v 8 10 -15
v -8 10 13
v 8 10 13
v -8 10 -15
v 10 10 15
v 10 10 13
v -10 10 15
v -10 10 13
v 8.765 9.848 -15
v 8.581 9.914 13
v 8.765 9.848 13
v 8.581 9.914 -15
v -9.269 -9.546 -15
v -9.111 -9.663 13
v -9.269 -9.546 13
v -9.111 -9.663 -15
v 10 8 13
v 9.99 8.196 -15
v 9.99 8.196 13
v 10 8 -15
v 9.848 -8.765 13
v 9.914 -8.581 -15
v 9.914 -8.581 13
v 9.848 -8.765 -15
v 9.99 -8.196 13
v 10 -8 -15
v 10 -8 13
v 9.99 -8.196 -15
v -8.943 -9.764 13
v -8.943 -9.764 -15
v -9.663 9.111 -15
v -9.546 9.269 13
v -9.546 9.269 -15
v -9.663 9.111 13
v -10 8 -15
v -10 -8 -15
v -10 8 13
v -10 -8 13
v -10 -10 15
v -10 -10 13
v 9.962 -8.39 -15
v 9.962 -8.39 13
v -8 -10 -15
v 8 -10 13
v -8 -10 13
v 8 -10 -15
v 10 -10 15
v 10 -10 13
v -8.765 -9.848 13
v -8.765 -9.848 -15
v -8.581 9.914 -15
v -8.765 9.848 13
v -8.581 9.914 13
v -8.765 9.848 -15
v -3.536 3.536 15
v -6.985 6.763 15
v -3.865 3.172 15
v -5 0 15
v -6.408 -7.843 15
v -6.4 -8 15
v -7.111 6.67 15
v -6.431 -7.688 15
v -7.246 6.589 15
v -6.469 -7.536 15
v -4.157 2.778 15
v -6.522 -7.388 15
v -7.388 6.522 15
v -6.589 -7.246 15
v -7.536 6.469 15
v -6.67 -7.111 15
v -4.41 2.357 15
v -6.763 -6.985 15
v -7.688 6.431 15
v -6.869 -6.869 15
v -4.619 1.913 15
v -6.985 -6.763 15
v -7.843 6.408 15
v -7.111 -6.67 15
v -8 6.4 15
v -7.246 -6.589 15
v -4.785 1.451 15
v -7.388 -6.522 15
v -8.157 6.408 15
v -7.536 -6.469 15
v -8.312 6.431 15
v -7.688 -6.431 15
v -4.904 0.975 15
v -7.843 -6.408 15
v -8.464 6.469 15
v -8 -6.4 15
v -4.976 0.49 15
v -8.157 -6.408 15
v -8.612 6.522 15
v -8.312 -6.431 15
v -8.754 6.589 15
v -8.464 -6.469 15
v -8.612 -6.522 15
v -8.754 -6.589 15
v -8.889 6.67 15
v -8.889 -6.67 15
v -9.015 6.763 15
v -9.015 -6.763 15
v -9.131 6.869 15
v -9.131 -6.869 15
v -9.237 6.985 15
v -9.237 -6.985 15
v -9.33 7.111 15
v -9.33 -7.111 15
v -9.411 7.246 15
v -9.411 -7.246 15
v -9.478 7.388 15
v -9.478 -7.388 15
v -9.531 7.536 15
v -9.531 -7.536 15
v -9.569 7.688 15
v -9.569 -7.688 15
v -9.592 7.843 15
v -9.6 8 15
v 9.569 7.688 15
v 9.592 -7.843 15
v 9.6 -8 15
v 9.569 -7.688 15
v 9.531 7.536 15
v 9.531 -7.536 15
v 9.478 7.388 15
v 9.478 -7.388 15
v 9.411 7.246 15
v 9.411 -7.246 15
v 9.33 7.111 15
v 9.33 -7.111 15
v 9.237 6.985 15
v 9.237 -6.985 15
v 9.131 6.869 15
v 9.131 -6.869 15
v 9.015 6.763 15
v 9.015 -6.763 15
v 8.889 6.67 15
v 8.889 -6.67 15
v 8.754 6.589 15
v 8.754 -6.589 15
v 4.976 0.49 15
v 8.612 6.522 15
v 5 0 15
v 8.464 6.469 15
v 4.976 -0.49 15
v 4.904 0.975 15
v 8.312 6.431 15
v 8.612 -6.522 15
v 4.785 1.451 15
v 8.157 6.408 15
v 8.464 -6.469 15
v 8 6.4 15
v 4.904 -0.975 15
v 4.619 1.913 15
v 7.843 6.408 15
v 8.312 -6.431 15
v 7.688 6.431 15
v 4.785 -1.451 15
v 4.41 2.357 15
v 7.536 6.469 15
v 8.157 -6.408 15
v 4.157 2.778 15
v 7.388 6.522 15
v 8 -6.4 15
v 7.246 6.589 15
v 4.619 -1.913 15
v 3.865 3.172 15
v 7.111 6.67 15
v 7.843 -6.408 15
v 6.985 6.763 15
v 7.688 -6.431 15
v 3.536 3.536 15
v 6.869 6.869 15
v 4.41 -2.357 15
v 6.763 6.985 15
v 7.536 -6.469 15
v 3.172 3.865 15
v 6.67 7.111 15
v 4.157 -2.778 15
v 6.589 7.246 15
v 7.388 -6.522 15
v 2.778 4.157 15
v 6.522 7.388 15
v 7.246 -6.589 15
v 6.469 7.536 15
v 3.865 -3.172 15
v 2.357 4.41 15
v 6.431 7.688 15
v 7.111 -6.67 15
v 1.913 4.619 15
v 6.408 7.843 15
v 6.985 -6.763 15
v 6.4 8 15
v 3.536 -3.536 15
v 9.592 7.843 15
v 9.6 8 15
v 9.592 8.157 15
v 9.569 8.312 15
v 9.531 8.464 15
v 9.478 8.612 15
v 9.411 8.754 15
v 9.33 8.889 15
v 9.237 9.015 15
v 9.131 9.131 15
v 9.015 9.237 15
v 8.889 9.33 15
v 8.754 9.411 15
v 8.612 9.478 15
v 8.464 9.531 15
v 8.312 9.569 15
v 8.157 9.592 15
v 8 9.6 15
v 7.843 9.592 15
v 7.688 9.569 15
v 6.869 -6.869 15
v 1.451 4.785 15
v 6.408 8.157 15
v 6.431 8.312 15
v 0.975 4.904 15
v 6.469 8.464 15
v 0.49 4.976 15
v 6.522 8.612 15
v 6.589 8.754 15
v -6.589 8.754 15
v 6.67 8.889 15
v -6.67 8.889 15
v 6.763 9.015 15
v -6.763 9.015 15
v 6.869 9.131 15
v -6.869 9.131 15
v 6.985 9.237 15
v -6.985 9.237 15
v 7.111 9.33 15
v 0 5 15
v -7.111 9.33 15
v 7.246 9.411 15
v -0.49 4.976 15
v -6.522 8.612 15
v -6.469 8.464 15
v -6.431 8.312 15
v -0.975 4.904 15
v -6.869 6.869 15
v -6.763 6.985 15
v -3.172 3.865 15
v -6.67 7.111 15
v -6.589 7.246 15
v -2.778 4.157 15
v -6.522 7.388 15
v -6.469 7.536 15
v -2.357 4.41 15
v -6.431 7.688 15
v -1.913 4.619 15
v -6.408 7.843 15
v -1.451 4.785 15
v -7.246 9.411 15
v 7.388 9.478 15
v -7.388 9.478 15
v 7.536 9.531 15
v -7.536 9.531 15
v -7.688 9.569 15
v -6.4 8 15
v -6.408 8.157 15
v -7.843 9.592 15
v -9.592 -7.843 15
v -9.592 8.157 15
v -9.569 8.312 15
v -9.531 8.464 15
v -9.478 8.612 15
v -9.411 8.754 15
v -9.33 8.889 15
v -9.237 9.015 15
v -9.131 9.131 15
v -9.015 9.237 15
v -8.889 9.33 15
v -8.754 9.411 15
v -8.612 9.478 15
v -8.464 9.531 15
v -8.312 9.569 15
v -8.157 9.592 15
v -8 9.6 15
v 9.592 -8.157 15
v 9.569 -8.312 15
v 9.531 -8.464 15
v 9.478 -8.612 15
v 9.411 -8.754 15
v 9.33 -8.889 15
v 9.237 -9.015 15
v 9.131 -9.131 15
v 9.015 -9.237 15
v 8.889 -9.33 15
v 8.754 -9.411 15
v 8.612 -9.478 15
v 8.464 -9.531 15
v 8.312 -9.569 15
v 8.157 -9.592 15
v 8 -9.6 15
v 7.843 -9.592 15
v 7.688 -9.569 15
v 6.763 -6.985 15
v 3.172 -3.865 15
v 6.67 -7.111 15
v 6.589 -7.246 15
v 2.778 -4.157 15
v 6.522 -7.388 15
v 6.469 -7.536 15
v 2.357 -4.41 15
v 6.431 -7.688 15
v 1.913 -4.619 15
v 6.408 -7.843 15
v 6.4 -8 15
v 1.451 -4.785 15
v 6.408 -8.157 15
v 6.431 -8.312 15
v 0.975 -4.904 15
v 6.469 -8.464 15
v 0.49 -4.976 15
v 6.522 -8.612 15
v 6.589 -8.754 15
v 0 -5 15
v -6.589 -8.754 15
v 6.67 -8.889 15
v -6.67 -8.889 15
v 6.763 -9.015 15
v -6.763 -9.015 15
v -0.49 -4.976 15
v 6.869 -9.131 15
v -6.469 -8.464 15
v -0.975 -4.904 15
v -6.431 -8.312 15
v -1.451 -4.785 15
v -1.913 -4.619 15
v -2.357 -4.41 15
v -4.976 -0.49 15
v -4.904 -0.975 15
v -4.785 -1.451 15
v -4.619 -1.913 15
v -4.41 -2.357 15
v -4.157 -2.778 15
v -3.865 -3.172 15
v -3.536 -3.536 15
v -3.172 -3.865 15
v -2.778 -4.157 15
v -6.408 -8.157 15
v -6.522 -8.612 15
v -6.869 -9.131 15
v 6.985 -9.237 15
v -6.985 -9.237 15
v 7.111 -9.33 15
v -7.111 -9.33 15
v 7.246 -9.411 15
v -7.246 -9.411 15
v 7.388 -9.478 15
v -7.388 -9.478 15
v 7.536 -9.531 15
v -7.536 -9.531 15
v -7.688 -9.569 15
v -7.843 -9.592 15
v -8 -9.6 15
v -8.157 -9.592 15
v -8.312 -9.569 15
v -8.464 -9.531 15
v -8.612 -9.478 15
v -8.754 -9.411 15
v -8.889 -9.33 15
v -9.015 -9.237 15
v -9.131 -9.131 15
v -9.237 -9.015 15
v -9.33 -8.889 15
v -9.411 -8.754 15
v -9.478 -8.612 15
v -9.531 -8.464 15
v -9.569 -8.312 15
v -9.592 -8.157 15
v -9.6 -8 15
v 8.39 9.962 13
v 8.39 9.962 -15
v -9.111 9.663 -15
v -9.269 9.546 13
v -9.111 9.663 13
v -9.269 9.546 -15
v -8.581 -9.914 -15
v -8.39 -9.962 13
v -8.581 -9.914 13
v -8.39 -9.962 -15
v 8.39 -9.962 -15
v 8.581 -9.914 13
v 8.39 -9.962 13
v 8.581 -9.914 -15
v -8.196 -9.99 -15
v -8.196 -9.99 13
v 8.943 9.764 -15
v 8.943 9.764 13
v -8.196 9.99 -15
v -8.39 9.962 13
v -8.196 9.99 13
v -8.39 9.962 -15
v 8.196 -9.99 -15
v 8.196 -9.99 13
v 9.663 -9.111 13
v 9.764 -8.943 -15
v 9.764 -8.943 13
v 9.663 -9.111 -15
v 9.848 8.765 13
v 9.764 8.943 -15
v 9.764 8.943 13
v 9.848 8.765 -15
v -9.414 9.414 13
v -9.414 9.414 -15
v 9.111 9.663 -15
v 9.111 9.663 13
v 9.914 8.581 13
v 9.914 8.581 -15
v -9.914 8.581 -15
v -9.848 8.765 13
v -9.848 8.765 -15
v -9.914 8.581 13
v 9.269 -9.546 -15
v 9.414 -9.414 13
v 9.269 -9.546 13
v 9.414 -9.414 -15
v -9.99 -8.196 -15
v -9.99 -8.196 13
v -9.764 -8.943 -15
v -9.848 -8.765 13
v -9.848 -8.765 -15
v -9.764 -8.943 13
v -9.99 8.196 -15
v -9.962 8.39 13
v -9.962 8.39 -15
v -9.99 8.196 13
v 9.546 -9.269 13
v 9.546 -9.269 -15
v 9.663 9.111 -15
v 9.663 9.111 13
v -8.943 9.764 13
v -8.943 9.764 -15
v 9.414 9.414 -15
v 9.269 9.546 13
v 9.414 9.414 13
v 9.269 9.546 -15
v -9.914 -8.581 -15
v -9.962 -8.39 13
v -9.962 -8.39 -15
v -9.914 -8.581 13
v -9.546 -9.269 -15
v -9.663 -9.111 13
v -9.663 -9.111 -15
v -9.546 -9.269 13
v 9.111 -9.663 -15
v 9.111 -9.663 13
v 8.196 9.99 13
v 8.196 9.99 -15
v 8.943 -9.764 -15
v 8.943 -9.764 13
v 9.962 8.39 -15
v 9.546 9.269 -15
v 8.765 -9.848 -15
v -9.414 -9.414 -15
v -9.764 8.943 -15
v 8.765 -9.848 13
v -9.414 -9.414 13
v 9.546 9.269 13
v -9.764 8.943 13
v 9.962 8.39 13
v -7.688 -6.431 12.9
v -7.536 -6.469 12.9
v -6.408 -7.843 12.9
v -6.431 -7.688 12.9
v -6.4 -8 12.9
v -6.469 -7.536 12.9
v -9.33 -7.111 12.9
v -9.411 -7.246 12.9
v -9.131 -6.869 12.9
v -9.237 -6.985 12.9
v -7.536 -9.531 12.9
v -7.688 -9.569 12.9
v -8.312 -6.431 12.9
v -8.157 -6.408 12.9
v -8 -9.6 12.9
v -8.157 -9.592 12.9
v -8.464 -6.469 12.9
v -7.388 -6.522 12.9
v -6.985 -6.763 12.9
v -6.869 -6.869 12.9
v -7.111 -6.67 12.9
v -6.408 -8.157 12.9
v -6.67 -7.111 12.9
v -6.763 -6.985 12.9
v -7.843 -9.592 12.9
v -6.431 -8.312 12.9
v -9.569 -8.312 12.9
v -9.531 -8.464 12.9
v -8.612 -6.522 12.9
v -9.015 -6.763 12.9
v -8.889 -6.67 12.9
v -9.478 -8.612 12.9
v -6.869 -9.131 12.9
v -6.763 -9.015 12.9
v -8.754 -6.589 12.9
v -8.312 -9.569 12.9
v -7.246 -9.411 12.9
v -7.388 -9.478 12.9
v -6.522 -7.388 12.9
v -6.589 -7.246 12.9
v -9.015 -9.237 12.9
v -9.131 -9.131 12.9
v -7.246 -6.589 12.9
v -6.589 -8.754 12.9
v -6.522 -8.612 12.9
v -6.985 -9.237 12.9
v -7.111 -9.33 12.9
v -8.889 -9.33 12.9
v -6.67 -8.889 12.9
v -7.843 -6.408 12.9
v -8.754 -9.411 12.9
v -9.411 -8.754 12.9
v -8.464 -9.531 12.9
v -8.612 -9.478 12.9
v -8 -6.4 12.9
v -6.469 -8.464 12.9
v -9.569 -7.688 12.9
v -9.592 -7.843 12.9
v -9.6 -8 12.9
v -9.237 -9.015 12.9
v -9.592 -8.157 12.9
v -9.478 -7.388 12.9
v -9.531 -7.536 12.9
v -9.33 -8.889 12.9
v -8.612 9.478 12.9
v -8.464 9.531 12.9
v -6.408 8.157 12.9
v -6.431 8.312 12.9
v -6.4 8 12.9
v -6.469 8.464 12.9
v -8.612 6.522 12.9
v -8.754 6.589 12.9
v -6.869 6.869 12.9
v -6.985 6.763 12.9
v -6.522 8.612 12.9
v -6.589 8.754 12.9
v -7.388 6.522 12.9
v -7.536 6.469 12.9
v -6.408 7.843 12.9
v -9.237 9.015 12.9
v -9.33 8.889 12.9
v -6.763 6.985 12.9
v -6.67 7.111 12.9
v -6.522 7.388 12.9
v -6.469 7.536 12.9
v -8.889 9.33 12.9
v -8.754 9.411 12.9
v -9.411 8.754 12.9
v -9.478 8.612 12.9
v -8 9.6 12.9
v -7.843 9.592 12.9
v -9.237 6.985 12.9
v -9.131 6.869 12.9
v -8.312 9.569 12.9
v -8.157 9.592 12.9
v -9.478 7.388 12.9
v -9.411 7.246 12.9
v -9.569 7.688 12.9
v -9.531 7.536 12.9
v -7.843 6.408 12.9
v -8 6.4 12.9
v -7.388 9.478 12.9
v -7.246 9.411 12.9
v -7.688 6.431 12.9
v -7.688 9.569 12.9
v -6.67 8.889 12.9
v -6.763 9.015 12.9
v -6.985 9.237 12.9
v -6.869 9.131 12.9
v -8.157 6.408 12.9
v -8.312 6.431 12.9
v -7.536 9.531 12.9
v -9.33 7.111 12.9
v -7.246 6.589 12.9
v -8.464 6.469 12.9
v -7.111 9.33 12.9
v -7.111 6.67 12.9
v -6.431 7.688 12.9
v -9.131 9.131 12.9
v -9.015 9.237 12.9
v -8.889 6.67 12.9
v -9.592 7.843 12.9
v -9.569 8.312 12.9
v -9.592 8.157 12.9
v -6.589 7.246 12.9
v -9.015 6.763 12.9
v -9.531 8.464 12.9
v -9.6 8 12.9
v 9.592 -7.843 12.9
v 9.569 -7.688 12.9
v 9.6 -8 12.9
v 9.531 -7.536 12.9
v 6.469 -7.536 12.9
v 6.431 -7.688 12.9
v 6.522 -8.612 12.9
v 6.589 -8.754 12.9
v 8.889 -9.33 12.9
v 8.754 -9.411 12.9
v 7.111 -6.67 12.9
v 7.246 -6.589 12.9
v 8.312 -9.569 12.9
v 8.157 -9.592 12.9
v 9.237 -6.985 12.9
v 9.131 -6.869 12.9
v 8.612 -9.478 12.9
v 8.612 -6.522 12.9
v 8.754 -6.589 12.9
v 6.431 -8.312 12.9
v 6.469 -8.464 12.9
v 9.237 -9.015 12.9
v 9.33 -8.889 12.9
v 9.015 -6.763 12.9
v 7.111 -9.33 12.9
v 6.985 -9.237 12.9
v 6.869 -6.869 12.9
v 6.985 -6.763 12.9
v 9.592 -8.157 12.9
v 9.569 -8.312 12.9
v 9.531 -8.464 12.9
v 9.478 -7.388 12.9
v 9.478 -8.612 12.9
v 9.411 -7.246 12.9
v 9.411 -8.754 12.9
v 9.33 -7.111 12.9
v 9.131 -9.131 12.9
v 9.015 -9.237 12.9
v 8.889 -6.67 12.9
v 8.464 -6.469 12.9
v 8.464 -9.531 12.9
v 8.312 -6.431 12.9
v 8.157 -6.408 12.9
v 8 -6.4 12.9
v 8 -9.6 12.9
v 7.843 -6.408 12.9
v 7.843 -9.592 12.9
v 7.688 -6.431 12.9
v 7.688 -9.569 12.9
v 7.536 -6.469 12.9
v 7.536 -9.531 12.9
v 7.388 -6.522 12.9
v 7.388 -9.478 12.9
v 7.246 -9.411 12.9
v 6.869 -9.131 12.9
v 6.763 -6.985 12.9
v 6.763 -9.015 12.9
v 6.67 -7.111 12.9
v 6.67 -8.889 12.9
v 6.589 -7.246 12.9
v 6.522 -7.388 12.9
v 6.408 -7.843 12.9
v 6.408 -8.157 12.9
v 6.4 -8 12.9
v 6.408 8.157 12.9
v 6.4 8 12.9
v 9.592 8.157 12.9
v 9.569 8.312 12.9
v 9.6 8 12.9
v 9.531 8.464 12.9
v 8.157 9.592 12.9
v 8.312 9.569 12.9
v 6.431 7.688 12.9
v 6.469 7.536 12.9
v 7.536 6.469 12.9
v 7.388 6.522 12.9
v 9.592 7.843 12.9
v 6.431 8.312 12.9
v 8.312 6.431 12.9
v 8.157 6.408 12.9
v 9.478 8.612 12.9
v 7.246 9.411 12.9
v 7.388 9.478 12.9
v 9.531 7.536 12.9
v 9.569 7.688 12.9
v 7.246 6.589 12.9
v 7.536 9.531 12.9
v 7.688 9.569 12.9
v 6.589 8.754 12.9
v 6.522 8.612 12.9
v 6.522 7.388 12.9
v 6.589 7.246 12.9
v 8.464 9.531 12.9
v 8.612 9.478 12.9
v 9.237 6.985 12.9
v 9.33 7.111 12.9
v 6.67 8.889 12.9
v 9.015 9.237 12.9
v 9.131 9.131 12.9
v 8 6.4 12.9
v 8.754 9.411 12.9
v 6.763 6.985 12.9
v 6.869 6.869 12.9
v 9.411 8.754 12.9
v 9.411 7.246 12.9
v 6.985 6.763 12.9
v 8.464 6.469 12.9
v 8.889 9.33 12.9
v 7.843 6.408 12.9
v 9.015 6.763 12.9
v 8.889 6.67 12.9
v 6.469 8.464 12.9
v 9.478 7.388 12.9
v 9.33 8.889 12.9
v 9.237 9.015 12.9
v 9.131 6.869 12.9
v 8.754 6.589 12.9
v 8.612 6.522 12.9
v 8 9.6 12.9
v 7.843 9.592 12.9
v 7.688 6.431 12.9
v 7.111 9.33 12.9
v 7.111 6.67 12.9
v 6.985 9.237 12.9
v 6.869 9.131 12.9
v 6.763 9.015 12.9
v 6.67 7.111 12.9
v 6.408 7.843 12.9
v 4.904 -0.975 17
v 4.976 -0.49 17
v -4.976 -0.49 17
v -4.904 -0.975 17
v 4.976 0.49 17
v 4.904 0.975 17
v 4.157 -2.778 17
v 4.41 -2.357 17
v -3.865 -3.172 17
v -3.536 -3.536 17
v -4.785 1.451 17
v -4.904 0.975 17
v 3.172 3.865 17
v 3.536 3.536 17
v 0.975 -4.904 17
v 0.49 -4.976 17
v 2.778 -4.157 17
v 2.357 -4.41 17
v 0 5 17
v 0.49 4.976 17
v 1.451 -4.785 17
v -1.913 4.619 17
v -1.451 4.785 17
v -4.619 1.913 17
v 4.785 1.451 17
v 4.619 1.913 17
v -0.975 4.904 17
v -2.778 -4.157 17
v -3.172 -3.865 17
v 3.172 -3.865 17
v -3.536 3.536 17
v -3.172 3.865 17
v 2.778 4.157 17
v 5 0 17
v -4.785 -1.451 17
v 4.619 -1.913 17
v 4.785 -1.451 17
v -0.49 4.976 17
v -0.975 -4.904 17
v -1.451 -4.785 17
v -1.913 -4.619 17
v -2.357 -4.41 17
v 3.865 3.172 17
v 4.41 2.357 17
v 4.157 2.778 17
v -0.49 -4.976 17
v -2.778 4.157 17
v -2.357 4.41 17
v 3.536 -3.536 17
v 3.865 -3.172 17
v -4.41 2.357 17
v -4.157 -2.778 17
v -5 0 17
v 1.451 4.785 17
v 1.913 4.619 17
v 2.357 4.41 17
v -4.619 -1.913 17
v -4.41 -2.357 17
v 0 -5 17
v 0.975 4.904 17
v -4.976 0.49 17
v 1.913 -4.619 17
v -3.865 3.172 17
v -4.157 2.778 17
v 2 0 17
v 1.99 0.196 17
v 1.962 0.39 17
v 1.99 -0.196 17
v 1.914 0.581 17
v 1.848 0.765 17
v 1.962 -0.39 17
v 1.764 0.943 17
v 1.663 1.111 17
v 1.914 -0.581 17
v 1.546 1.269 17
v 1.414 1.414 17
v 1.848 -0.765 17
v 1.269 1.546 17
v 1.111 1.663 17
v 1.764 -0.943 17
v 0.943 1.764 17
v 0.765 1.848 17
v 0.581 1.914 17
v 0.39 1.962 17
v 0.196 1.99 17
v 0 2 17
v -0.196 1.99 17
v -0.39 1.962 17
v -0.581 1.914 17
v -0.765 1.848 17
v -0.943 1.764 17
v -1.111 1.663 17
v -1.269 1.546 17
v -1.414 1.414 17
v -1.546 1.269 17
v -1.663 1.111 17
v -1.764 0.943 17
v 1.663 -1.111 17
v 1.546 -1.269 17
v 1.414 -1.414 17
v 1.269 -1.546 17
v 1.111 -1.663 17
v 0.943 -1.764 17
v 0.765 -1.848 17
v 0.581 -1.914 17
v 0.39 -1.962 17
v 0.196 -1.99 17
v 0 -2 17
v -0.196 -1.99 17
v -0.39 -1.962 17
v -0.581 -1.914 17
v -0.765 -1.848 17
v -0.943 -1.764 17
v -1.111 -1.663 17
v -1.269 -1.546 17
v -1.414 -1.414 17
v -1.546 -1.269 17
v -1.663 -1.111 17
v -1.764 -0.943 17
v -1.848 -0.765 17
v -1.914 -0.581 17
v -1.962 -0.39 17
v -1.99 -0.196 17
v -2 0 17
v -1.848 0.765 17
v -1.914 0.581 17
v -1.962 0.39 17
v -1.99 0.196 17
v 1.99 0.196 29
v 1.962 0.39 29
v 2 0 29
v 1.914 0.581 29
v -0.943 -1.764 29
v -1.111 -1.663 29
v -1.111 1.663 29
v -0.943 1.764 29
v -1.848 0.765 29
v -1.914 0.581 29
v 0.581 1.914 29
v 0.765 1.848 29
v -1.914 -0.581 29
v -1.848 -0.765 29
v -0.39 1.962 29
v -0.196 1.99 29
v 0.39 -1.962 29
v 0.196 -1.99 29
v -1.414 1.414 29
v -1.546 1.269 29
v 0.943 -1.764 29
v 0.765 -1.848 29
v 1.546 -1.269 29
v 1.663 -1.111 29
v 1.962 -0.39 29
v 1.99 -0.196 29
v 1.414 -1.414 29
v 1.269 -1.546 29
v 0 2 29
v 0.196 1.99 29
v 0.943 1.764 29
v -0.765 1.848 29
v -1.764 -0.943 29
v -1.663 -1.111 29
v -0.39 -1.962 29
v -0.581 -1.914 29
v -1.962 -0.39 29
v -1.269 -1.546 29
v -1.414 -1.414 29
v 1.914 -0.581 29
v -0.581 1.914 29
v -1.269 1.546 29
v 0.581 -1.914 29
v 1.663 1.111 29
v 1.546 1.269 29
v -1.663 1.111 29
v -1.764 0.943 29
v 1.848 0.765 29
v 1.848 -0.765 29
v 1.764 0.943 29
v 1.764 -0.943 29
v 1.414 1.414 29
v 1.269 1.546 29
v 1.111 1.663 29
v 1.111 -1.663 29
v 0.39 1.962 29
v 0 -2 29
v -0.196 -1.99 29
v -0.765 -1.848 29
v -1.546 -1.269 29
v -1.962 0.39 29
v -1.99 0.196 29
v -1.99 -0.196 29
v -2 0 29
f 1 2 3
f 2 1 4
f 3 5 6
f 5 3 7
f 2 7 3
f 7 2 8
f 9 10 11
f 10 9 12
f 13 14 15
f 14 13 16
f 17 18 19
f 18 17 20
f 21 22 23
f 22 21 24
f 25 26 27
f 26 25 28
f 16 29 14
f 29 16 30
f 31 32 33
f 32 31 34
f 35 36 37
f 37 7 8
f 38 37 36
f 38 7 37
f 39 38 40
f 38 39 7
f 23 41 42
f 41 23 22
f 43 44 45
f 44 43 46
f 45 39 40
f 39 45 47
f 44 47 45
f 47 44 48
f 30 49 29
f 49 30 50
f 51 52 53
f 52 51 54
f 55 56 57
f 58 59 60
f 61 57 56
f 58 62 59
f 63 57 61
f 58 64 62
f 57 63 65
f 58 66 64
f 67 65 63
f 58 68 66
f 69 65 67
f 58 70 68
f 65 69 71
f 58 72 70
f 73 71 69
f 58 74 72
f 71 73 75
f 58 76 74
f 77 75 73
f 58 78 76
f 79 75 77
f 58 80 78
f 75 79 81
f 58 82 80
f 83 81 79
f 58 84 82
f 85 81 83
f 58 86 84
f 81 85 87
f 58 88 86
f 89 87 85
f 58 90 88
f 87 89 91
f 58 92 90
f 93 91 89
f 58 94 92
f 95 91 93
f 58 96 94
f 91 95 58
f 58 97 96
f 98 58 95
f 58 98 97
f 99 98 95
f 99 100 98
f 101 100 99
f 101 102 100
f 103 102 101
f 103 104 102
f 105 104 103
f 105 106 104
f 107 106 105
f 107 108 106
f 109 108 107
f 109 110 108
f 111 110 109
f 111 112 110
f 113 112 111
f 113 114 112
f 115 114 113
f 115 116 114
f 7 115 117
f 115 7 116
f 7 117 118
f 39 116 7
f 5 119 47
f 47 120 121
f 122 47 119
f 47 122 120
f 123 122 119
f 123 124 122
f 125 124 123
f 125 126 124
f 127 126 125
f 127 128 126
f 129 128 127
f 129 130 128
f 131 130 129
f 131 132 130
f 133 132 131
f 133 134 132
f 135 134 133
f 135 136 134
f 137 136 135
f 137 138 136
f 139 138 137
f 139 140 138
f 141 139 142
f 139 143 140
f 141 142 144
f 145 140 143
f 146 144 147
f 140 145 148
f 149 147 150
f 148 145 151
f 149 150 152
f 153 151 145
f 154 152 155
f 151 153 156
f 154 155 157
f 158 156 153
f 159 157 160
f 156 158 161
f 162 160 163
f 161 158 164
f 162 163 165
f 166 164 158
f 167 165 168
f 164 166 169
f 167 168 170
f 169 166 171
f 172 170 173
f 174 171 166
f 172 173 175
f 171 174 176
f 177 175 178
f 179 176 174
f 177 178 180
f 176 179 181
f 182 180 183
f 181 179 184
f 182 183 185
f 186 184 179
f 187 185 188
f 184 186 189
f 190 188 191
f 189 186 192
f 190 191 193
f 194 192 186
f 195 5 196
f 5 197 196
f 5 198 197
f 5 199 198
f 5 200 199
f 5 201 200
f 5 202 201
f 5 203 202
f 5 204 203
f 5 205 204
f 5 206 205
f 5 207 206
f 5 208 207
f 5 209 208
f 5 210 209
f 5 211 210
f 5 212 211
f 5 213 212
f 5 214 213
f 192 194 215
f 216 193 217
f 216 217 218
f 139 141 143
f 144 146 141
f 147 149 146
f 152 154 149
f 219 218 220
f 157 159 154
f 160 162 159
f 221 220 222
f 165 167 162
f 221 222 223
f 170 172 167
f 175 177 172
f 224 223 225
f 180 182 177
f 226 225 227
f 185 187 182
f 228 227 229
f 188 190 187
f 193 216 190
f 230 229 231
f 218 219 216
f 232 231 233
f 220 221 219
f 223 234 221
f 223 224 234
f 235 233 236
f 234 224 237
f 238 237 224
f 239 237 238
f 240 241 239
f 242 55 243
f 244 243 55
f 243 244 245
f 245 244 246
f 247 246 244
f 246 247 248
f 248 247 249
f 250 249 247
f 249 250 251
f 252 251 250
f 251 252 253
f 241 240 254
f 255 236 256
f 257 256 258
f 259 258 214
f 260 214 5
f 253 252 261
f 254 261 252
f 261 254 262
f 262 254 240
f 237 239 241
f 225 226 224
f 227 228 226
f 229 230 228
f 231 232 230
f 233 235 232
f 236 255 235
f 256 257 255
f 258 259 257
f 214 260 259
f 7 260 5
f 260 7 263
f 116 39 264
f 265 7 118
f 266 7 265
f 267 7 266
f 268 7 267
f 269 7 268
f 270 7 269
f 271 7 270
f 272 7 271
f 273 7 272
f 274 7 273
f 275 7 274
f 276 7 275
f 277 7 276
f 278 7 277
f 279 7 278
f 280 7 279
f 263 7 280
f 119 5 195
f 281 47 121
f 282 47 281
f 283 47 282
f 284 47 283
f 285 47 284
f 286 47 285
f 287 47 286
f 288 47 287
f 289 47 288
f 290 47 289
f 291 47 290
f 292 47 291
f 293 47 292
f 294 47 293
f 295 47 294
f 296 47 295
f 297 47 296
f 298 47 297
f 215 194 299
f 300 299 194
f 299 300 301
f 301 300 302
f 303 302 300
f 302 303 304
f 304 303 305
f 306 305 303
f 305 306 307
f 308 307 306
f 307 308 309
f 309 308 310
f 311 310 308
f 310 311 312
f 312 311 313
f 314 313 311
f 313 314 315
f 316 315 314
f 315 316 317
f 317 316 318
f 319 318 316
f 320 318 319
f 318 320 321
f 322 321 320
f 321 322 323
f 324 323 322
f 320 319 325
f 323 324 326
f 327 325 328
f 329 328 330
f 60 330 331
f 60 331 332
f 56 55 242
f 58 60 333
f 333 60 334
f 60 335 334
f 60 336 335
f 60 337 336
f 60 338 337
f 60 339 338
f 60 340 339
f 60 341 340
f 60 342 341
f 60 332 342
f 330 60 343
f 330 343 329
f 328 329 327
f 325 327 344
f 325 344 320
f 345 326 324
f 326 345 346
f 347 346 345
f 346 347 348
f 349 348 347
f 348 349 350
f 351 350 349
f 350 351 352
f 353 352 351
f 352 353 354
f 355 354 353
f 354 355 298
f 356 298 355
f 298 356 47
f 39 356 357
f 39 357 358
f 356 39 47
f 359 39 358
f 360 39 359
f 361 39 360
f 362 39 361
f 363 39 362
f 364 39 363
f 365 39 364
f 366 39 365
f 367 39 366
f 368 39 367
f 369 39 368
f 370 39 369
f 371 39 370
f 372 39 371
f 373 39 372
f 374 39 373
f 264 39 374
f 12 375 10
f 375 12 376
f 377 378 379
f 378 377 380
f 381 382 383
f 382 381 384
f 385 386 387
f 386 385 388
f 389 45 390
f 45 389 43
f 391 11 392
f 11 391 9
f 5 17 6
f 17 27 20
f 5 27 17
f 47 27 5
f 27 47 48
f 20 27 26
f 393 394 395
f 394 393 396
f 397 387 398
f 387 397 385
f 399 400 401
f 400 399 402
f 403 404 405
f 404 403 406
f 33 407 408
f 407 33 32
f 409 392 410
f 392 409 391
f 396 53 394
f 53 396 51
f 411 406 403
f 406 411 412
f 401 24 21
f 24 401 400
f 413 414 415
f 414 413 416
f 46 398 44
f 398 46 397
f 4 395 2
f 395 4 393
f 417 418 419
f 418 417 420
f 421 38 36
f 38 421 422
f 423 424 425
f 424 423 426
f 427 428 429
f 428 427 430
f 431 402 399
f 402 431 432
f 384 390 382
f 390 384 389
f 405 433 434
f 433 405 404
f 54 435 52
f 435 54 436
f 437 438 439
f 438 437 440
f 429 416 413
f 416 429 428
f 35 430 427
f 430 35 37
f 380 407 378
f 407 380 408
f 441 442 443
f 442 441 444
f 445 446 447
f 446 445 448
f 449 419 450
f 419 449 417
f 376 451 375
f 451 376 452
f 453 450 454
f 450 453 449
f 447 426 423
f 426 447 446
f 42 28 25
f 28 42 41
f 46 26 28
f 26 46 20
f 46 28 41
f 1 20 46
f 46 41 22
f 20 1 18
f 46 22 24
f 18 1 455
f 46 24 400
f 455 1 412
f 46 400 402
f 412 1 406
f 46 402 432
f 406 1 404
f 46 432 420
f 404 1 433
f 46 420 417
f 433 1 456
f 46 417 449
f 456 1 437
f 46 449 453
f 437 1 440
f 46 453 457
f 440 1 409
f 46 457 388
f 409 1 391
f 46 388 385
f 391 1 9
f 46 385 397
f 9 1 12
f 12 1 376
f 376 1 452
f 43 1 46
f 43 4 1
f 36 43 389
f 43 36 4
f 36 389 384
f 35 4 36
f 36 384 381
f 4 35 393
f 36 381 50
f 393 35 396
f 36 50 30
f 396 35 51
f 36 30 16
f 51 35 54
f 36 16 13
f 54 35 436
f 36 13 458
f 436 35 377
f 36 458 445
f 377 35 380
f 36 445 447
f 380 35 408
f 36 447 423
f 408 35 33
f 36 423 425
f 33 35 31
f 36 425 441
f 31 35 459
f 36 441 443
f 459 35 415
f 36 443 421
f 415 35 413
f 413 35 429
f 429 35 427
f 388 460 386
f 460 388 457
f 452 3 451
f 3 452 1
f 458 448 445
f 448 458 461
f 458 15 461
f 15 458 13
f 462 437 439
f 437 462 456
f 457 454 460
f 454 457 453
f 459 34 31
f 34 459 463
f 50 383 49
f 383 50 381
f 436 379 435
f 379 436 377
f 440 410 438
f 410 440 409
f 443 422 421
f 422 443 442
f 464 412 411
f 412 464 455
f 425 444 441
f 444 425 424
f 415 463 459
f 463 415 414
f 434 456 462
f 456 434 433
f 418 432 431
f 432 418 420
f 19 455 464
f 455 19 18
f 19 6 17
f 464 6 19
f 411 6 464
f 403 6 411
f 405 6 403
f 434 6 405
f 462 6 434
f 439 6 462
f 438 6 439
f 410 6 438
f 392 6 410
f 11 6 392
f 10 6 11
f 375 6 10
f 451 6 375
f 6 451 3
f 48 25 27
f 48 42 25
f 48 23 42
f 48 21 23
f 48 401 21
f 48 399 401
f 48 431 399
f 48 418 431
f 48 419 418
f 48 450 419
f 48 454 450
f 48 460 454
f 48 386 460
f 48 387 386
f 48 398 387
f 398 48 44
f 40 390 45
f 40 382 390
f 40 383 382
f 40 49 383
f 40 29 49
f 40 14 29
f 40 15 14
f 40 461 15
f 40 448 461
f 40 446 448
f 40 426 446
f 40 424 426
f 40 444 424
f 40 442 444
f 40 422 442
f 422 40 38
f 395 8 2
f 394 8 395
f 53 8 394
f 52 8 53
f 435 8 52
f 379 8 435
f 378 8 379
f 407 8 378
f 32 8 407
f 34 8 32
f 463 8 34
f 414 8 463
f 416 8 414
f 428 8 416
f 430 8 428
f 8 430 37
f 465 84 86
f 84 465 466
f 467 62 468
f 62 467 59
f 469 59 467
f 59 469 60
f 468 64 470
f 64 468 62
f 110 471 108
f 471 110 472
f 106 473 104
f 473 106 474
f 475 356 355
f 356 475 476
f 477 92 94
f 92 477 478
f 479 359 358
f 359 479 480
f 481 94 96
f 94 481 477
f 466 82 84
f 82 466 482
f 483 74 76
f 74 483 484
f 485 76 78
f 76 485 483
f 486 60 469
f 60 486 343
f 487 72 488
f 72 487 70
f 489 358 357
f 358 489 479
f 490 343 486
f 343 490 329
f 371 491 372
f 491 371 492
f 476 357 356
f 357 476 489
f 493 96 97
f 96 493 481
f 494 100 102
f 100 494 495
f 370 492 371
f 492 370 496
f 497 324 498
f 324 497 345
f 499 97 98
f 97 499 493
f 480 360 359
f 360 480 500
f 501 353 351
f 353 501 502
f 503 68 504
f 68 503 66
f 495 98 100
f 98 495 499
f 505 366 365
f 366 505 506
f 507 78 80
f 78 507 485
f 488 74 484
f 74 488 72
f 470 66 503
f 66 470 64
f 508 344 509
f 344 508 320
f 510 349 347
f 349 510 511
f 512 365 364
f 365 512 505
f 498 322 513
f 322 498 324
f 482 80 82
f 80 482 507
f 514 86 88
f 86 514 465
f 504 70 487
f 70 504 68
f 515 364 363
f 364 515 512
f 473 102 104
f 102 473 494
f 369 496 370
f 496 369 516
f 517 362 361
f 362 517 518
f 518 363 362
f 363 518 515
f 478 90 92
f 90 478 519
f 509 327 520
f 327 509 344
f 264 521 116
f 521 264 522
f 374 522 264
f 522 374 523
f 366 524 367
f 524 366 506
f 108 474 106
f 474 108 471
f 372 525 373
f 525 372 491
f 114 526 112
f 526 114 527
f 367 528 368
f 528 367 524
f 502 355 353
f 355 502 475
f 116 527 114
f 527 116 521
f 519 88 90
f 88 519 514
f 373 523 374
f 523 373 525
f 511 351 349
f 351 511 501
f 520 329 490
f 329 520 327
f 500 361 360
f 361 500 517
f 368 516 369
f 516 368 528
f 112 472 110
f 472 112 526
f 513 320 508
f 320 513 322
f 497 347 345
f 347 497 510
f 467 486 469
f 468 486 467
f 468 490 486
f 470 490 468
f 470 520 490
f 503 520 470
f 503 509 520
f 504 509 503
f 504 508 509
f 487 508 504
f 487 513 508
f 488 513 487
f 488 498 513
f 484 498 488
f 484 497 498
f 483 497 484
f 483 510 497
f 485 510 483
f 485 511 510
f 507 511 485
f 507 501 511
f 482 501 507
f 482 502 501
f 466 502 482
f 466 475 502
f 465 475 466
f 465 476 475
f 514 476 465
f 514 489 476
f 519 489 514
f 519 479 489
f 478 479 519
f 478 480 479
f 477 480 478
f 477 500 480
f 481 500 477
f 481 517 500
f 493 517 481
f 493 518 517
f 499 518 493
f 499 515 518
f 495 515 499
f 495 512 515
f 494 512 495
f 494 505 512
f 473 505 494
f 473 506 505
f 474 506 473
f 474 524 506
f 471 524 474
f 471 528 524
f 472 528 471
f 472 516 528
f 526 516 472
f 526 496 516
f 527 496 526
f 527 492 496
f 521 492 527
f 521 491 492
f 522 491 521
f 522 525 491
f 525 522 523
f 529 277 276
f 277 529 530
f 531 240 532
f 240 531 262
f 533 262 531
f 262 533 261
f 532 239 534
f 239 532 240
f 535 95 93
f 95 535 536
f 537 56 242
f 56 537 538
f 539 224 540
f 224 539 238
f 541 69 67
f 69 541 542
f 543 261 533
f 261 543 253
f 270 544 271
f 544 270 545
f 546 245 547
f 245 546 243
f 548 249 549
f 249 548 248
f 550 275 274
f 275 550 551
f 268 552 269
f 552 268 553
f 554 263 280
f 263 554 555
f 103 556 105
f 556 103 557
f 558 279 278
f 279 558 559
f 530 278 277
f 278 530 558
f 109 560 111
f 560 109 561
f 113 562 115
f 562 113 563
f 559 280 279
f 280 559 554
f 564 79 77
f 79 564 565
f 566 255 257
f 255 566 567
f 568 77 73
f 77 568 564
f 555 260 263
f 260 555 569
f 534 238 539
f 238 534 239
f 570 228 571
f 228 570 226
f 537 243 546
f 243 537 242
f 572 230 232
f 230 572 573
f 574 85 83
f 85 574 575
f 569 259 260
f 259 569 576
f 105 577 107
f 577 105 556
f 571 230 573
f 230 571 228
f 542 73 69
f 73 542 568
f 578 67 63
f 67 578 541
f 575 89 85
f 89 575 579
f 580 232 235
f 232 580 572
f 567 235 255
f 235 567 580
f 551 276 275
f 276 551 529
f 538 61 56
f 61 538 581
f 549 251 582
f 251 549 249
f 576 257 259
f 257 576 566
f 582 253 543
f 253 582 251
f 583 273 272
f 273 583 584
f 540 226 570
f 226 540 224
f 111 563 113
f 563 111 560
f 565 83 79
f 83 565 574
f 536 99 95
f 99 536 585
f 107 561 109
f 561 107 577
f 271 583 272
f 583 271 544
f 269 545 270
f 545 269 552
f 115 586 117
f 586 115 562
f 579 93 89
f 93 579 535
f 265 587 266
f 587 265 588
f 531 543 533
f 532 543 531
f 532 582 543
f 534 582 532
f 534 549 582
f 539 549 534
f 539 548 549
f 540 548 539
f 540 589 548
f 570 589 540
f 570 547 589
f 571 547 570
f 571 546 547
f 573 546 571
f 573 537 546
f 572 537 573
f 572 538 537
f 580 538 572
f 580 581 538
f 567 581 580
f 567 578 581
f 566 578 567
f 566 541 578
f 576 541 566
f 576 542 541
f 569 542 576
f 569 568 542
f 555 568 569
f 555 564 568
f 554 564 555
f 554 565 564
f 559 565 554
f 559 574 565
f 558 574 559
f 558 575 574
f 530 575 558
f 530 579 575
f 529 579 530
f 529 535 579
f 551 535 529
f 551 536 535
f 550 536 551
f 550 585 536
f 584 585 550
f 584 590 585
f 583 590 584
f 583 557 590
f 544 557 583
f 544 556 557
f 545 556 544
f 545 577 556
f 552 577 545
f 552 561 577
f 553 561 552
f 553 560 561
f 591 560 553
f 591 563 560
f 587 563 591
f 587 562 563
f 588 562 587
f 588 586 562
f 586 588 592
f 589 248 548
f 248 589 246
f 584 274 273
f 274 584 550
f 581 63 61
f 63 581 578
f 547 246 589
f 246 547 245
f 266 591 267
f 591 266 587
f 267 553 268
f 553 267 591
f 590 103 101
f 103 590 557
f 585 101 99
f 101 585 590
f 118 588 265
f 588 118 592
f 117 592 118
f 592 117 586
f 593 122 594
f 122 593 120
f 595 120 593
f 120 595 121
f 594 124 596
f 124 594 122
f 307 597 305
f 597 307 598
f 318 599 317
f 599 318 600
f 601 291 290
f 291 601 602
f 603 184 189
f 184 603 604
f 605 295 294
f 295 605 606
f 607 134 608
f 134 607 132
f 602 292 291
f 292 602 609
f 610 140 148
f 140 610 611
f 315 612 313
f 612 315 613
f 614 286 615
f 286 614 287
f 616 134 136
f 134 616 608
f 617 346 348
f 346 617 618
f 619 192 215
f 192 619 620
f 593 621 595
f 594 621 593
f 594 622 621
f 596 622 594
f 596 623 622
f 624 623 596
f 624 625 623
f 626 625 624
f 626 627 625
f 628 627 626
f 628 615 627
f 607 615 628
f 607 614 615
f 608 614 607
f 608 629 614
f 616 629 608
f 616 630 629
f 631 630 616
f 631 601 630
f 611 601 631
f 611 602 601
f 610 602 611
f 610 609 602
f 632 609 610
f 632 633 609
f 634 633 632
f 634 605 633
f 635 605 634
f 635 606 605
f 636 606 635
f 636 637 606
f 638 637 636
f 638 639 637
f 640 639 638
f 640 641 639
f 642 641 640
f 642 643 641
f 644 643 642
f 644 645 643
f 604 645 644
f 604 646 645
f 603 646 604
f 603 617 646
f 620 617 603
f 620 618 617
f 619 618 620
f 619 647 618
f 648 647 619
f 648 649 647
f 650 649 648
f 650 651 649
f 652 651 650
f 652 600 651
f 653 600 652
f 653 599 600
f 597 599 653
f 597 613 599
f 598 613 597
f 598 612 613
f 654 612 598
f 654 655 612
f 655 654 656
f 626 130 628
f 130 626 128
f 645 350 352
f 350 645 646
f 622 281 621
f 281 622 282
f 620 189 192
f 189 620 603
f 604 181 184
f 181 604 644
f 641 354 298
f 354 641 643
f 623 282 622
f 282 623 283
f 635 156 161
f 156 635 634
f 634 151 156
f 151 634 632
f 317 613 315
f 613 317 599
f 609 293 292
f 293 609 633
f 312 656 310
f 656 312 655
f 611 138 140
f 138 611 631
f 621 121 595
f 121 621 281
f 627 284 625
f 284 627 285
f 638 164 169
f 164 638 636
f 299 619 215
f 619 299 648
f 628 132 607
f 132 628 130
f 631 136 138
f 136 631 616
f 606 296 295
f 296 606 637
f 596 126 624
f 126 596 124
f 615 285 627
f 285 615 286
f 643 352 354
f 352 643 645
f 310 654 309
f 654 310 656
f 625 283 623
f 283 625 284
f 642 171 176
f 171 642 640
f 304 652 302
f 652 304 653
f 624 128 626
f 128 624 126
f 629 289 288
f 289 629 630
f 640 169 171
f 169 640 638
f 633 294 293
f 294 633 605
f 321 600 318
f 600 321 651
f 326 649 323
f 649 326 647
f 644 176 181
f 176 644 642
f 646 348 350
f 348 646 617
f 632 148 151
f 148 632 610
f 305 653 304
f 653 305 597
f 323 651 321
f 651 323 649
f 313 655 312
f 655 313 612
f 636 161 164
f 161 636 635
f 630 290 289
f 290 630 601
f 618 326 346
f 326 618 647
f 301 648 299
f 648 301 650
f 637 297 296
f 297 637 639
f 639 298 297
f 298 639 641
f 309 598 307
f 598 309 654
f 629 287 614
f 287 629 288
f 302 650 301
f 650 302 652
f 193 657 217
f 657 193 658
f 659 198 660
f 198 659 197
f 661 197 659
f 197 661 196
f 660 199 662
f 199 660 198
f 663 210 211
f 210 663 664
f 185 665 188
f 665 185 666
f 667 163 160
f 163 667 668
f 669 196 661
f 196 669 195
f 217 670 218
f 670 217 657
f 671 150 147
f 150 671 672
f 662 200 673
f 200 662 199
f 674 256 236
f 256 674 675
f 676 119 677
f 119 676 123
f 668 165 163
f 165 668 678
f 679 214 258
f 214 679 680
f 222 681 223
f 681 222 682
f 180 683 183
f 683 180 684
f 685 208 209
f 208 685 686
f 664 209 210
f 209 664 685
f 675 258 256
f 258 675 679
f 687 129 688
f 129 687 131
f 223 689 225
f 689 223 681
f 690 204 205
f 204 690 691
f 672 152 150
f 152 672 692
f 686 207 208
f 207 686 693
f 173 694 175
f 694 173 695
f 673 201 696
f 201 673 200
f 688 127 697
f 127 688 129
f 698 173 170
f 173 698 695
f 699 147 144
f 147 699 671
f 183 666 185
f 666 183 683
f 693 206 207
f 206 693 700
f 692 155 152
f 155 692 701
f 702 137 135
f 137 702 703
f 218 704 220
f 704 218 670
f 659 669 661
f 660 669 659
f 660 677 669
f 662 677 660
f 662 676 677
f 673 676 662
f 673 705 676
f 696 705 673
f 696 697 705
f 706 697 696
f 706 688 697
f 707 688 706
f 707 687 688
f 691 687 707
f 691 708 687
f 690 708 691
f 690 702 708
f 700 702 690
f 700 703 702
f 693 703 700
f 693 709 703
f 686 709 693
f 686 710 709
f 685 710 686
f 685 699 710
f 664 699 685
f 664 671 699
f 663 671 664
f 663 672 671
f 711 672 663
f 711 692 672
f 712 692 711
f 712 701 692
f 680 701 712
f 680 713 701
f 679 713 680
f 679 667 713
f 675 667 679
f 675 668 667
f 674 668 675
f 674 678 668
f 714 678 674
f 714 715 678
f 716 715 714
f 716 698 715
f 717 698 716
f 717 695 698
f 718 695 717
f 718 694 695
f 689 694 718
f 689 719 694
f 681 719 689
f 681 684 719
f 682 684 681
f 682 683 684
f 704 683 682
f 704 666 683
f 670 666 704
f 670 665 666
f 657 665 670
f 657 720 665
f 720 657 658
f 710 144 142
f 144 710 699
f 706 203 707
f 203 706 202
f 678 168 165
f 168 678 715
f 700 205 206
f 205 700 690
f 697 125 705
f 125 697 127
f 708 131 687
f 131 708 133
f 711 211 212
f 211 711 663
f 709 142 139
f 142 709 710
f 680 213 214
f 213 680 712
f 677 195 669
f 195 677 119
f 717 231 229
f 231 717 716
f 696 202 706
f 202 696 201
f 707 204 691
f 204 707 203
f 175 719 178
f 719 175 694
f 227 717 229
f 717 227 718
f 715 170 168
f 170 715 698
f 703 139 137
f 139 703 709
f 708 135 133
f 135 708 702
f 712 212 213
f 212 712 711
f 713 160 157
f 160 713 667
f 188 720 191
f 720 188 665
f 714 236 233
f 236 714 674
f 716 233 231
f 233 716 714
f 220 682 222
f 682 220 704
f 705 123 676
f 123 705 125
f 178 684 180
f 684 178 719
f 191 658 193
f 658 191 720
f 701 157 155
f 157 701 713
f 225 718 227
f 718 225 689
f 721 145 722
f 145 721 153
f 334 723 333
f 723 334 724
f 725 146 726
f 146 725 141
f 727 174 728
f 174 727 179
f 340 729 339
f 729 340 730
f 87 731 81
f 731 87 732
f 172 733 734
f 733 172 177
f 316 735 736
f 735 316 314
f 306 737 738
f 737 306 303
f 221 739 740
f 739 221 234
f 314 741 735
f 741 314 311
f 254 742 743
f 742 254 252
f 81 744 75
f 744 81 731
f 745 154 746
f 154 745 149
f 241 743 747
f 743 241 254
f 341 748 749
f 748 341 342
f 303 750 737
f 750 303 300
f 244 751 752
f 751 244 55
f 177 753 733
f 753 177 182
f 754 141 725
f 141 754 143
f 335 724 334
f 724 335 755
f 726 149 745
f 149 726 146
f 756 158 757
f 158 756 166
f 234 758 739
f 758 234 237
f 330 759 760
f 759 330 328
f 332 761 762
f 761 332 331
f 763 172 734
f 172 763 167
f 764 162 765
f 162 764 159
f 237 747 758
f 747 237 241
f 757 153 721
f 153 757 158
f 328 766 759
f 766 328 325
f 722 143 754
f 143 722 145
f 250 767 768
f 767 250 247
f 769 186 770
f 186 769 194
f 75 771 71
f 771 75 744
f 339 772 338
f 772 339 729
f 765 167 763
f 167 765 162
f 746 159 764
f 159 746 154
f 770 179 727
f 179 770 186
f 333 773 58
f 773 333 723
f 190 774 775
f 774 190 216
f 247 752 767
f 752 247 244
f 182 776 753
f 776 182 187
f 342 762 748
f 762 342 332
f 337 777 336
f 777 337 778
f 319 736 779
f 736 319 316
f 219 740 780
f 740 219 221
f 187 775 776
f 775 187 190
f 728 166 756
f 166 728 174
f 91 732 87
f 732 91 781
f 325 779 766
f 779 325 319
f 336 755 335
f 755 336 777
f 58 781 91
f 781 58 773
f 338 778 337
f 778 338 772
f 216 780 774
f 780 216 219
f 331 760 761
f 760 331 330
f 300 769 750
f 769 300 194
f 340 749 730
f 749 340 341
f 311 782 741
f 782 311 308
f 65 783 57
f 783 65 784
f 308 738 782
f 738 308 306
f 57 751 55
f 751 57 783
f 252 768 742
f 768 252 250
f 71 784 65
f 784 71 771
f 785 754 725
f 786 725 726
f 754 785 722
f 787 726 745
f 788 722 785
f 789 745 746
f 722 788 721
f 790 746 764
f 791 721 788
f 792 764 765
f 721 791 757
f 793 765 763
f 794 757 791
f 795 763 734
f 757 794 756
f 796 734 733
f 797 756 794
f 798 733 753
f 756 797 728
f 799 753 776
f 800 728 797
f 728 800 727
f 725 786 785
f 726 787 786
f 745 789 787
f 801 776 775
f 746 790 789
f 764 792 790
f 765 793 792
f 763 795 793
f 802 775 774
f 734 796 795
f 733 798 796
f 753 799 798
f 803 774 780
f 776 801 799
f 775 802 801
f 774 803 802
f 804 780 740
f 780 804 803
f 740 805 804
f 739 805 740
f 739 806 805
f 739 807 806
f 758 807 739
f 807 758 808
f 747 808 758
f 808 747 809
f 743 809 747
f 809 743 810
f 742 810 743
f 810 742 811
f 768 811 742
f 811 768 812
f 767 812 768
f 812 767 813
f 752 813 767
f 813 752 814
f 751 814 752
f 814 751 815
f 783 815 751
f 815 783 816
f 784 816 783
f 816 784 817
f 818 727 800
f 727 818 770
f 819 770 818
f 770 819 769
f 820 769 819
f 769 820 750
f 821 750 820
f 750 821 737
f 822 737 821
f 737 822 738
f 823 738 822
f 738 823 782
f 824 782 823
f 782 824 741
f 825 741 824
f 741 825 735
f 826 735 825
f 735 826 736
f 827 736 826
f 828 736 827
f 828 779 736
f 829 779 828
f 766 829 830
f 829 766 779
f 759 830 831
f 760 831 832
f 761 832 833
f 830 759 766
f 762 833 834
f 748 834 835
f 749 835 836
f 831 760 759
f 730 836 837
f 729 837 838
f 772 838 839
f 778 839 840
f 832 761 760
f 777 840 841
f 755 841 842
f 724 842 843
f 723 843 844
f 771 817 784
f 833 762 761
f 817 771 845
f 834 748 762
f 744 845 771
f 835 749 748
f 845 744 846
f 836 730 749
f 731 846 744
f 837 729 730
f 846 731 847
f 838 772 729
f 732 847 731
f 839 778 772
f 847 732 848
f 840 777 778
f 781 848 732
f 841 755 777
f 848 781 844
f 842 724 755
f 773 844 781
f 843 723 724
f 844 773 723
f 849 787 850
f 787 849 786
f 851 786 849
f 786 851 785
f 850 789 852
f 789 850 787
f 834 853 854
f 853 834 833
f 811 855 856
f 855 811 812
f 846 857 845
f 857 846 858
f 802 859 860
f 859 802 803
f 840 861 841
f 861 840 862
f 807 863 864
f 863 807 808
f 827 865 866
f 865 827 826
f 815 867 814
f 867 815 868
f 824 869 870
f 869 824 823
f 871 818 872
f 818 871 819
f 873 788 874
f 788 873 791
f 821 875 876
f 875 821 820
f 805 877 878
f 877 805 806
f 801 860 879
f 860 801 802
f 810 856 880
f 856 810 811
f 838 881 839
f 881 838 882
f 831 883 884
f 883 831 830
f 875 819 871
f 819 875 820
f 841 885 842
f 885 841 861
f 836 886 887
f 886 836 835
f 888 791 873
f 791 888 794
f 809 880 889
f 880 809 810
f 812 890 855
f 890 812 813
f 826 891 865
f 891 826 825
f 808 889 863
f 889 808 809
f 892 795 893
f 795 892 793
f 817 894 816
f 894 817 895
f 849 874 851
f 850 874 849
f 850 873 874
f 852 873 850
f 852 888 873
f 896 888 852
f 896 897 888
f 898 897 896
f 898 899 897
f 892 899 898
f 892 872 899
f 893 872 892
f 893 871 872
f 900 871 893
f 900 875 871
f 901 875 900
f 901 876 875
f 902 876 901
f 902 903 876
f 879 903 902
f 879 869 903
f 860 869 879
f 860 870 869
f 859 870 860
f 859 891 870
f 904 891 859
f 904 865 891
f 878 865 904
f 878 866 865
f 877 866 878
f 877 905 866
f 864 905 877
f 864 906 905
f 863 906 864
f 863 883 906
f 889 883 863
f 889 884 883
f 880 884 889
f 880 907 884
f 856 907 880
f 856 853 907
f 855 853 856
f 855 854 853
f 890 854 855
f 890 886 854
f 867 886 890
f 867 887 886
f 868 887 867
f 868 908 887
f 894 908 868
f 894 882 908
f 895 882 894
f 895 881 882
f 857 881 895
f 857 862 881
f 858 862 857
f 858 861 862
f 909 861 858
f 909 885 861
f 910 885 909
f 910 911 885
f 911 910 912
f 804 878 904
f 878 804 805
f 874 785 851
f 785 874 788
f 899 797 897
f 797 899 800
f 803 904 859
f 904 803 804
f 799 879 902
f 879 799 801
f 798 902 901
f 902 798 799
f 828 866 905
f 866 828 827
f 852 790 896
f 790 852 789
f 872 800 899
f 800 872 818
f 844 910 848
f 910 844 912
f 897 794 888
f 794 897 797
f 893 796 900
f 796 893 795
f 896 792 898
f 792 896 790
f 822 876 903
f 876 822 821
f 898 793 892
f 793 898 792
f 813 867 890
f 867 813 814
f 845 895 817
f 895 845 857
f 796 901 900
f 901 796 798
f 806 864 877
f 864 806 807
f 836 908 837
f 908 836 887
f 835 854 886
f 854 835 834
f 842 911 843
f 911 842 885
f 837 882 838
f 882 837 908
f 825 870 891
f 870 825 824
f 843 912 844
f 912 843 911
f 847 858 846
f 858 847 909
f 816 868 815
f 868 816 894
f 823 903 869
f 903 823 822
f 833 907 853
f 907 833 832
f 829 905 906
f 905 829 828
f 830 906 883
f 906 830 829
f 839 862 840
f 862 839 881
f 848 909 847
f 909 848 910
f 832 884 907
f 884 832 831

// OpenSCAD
$fn=64;

face_w = 20.0;
body_len = 30.0;
shaft_d = 4.0;
shaft_len = 12.0;

mount_spacing = 16.0;
mount_hole_d = 3.2;

corner_r = 2.0;
front_plate_t = 2.0;

boss_d = 10.0;
boss_h = 2.0;

module rounded_box(size=[20,20,30], r=2) {
    x = size[0]; y = size[1]; z = size[2];
    hull() {
        for (sx=[-1,1], sy=[-1,1]) {
            translate([sx*(x/2 - r), sy*(y/2 - r), -z/2])
                cylinder(h=z, r=r);
        }
    }
}

module motor_body() {
    union() {
        rounded_box([face_w, face_w, body_len], corner_r);
        translate([0,0, body_len/2 - front_plate_t/2])
            cube([face_w, face_w, front_plate_t], center=true);
    }
}

module mounting_holes() {
    for (sx=[-1,1], sy=[-1,1]) {
        translate([sx*mount_spacing/2, sy*mount_spacing/2, body_len/2 - front_plate_t - 0.1])
            cylinder(h=front_plate_t + 0.2, d=mount_hole_d);
    }
}

module front_features() {
    union() {
        translate([0,0, body_len/2])
            cylinder(h=boss_h, d=boss_d);
        translate([0,0, body_len/2 + boss_h])
            cylinder(h=shaft_len, d=shaft_d);
    }
}

module stepper_motor() {
    union() {
        difference() {
            motor_body();
            mounting_holes();
        }
        front_features();
    }
}

stepper_motor();
